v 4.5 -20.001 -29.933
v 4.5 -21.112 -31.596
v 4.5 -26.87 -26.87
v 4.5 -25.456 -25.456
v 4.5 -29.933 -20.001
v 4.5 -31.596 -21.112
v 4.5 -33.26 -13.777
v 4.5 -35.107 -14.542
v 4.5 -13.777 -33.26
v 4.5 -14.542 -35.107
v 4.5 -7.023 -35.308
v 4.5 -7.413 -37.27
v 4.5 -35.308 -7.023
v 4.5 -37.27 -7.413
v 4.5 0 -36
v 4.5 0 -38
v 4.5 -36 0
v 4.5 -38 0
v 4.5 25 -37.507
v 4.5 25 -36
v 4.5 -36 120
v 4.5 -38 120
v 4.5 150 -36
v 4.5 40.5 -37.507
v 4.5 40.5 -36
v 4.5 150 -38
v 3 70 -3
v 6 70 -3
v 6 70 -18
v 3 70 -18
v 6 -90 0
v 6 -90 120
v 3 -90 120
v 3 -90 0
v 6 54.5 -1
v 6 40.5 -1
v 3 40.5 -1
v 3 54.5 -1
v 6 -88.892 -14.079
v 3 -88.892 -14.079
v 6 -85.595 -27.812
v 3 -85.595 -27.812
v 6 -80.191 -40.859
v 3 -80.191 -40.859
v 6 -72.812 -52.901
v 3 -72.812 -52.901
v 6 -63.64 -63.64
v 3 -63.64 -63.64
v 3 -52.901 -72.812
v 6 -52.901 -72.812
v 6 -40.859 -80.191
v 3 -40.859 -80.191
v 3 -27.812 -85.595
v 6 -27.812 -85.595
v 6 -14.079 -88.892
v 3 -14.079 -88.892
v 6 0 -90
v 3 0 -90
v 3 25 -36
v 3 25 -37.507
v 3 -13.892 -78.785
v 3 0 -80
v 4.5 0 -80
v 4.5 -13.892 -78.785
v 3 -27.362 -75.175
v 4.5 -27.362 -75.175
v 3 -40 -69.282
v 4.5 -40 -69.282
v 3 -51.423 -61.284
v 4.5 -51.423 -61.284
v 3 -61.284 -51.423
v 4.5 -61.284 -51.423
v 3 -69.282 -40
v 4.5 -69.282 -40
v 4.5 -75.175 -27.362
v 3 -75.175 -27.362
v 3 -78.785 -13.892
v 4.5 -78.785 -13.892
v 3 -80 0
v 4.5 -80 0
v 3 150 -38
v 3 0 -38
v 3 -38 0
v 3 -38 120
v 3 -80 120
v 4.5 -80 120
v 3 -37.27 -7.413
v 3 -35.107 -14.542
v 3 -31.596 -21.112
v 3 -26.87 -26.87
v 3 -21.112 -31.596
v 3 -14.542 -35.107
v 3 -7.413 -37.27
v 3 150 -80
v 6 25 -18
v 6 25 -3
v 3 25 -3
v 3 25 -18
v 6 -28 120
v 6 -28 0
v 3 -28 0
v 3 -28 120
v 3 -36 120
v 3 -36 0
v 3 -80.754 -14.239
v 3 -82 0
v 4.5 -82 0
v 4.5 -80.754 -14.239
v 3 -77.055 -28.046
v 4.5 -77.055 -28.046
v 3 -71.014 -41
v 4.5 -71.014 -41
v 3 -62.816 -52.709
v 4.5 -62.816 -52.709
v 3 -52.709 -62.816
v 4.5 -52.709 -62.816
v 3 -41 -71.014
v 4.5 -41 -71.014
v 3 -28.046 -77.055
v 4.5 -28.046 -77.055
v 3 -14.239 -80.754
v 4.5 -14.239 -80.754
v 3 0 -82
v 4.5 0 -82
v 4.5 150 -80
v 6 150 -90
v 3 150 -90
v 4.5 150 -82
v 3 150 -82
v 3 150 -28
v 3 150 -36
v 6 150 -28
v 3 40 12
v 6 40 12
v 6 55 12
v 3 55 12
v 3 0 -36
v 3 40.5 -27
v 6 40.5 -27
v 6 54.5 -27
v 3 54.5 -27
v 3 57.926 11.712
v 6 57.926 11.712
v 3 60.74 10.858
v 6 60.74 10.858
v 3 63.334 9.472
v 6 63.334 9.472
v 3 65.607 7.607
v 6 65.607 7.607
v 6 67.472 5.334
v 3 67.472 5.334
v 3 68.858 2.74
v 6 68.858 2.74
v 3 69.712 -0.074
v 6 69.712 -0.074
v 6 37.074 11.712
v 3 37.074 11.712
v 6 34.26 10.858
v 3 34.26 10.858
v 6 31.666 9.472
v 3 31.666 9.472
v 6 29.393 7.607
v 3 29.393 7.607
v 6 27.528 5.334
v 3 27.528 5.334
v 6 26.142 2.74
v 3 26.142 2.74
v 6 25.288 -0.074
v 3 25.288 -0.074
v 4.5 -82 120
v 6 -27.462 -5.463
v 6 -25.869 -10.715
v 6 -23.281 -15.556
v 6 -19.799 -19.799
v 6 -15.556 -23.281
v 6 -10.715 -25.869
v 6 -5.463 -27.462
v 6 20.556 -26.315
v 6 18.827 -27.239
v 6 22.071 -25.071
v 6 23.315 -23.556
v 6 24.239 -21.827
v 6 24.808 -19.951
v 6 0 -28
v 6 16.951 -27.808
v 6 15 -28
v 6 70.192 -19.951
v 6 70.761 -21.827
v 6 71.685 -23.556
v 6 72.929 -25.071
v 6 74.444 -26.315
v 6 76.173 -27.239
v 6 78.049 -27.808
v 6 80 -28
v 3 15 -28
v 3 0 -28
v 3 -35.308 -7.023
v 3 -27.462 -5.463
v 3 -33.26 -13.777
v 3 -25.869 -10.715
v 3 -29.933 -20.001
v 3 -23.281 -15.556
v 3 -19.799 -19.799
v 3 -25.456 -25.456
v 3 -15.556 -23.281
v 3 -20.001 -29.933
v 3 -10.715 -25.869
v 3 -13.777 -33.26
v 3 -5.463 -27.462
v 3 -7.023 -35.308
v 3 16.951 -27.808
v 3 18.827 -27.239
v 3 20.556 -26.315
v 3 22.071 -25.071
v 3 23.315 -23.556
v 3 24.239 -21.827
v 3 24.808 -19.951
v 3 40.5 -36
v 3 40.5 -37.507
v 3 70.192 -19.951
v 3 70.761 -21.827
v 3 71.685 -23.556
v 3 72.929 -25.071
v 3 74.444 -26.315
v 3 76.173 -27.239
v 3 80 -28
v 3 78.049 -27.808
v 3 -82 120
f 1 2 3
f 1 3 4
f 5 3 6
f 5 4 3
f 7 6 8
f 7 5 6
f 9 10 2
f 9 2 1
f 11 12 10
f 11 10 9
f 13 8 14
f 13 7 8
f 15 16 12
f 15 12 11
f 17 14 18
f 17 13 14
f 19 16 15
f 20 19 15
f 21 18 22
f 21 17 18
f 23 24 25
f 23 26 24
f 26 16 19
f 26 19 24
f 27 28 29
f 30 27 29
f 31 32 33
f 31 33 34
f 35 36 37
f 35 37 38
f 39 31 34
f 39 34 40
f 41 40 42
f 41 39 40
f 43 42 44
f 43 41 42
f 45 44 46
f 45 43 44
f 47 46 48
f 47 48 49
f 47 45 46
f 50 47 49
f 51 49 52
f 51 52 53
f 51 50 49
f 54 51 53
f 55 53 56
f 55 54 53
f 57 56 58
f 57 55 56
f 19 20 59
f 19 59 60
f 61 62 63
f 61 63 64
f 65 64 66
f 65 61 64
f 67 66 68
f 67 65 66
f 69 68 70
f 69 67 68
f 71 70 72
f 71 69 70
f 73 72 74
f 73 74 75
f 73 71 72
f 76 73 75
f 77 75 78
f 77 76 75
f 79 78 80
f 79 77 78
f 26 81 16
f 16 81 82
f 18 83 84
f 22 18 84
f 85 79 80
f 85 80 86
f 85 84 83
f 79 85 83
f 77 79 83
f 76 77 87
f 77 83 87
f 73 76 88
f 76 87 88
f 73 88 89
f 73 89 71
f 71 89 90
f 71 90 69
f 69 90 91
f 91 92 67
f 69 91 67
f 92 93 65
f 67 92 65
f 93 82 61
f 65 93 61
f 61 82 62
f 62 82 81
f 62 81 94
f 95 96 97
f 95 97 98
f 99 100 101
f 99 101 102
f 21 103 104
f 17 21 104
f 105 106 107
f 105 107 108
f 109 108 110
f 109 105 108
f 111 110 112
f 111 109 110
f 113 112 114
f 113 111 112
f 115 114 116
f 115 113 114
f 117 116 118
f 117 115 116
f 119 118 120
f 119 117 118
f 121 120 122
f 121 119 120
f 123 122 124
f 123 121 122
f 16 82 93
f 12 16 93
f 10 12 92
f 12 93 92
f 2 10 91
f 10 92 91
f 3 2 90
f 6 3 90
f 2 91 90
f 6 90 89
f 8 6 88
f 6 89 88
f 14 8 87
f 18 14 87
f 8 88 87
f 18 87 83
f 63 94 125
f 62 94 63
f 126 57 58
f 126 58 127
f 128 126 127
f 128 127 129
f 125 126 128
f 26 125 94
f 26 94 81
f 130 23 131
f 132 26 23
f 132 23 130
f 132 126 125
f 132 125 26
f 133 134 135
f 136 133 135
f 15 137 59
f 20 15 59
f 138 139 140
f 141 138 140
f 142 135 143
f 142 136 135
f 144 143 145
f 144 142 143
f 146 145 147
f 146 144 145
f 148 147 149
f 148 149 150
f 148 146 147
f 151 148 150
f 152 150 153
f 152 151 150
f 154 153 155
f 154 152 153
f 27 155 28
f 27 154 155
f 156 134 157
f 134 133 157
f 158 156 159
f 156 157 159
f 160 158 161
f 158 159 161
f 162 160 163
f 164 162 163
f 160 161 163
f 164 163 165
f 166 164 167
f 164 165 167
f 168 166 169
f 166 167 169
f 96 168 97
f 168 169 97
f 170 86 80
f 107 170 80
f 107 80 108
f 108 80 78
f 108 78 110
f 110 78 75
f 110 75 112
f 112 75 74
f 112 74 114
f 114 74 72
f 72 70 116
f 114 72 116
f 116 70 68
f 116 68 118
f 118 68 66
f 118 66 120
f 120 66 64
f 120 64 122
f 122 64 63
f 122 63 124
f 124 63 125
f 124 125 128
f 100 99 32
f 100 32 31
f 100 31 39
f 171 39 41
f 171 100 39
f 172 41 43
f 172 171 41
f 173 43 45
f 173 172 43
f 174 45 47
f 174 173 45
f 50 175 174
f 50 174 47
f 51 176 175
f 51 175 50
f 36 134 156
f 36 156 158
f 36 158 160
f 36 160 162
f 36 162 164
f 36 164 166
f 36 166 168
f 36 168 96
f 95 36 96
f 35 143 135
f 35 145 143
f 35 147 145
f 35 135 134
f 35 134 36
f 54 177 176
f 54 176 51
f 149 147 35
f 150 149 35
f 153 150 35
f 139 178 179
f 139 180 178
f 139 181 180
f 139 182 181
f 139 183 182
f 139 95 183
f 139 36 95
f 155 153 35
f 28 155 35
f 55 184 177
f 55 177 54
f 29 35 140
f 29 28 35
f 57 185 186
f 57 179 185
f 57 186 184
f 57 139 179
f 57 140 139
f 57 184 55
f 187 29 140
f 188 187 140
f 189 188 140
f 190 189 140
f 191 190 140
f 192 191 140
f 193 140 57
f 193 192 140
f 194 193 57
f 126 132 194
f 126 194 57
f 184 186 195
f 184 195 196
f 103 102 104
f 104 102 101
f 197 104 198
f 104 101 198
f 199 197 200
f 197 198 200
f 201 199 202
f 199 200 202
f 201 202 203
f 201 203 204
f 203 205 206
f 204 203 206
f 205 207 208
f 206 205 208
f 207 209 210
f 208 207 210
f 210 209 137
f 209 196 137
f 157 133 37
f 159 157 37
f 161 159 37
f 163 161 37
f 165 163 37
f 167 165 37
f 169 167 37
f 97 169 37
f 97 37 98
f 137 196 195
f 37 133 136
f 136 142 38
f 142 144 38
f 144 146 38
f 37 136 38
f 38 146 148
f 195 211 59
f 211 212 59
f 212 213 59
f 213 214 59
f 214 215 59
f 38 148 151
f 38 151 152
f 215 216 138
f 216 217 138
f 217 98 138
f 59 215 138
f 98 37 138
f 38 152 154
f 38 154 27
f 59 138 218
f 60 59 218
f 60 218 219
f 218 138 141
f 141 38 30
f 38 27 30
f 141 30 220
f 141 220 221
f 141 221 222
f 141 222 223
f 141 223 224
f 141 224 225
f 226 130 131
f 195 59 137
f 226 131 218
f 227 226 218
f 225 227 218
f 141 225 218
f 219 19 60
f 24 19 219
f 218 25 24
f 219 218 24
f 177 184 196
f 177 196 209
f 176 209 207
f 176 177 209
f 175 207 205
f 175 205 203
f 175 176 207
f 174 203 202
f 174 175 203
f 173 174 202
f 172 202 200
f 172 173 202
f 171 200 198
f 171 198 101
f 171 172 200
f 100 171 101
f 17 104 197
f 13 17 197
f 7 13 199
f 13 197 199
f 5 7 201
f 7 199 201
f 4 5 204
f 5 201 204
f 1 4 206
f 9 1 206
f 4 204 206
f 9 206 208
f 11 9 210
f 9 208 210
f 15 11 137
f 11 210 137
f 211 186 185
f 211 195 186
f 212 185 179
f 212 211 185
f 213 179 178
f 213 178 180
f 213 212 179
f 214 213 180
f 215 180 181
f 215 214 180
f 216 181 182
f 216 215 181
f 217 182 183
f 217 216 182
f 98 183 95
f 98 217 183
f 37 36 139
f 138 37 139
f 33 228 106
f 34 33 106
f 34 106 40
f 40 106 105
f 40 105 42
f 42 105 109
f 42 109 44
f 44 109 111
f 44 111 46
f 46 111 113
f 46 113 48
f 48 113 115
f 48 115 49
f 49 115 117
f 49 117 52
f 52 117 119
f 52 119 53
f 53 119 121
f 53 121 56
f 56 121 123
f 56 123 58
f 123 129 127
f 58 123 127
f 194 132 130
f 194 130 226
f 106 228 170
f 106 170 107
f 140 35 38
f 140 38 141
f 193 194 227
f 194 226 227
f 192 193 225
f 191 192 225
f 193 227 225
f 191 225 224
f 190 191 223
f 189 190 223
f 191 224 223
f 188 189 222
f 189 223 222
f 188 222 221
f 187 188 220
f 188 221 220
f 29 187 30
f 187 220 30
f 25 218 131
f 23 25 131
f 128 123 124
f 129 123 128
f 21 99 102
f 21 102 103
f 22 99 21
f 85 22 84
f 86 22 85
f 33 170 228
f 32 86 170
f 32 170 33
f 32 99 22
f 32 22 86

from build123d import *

# Parameters (mm, degrees)
BOSS_EXTRUDE1_DEPTH = 3
CUT_EXTRUDE1_DEPTH  = 1.5
SKETCH5_W           = 40
SKETCH5_H           = 45
BOSS_EXTRUDE2_DEPTH = 3
SKETCH6_W           = 26
SKETCH6_H           = 14
CUT_EXTRUDE2_DEPTH  = 3
FILLET1_R           = 15
SKETCH7_W           = 10.438197785
SKETCH7_H           = 15.5
SKETCH7_W_2         = 18.220797936
BOSS_EXTRUDE3_DEPTH = 3
FILLET2_R           = 10


with BuildPart() as part:
    # Sketch1 → Boss-Extrude1 (new body)
    with BuildSketch(Plane(origin=(0, 0, 0), x_dir=(0, 0, -1), z_dir=(1, 0, 0))):
        with BuildLine():
            Line((0, -28), (-120, -28))
            Line((-120, -28), (-120, -90))
            Line((-120, -90), (0, -90))
            ThreePointArc((0, -90), (63.639610307, -63.639610307), (90, 0))
            Line((90, 0), (90, 150))
            Line((90, 150), (28, 150))
            Line((28, 150), (28, 0))
            ThreePointArc((28, 0), (19.798989873, -19.798989873), (0, -28))
        make_face()
    extrude(amount=BOSS_EXTRUDE1_DEPTH)

    # Sketch2 → Cut-Extrude1 (cut)
    with BuildSketch(Plane(origin=(3, 0, 0), x_dir=(0, 0, -1), z_dir=(1, 0, 0))):
        with BuildLine():
            Line((0, -38), (-120, -38))
            Line((-120, -38), (-120, -36))
            Line((-120, -36), (0, -36))
            ThreePointArc((0, -36), (25.455844123, -25.455844123), (36, 0))
            Line((36, 0), (36, 150))
            Line((36, 150), (38, 150))
            Line((38, 150), (38, 0))
            ThreePointArc((38, 0), (26.870057685, -26.870057685), (0, -38))
        make_face()
        with BuildLine():
            Line((0, -80), (-120, -80))
            Line((-120, -80), (-120, -82))
            Line((-120, -82), (0, -82))
            ThreePointArc((0, -82), (57.982756057, -57.982756057), (82, 0))
            Line((82, 0), (82, 150))
            Line((82, 150), (80, 150))
            Line((80, 150), (80, 0))
            ThreePointArc((80, 0), (56.568542495, -56.568542495), (0, -80))
        make_face()
    extrude(amount=-CUT_EXTRUDE1_DEPTH, mode=Mode.SUBTRACT)


with BuildPart() as body_2:
    # Mirror1: mirrored copy
    add(part.part.mirror(Plane(origin=(3, 0, 0), x_dir=(0, 0, 1), z_dir=(1, 0, 0))))



with BuildPart() as body_2_2:
    # Sketch5 → Boss-Extrude2 (new body)
    with BuildSketch(Plane(origin=(6, 0, 0), x_dir=(0, 0, -1), z_dir=(1, 0, 0))):
        with Locations((8, 47.5)):
            Rectangle(SKETCH5_W, SKETCH5_H)
    extrude(amount=-BOSS_EXTRUDE2_DEPTH)

    # Sketch6 → Cut-Extrude2 (cut)
    with BuildSketch(Plane(origin=(6, 0, 0), x_dir=(0, 0, -1), z_dir=(1, 0, 0))):
        with Locations((14, 47.5)):
            Rectangle(SKETCH6_W, SKETCH6_H)
    extrude(amount=-CUT_EXTRUDE2_DEPTH, mode=Mode.SUBTRACT)

    # Fillet1
    fillet1_edges = [body_2_2.edges().sort_by_distance(p)[0] for p in [
        (4.5, 25, 12),
        (4.5, 70, 12),
    ]]
    fillet(fillet1_edges, radius=FILLET1_R)


with BuildPart() as body_2_1:
    add(body_2.part)

    add(body_2_2.part)  # Boss-Extrude3 merges body 2 2
    # Sketch7 → Boss-Extrude3 (add)
    with BuildSketch(Plane(origin=(6, 0, 0), x_dir=(0, 0, -1), z_dir=(1, 0, 0))):
        with Locations((26.467997442, 62.25)):
            Rectangle(SKETCH7_W, SKETCH7_H)
        with Locations((28.397040912, 32.75)):
            Rectangle(SKETCH7_W_2, SKETCH7_H)
    extrude(amount=-BOSS_EXTRUDE3_DEPTH)

    # Fillet2
    fillet2_edges = [body_2_1.edges().sort_by_distance(p)[0] for p in [
        (4.5, 70, -28),
        (4.5, 25, -28),
    ]]
    fillet(fillet2_edges, radius=FILLET2_R)


solid = body_2_1.part
